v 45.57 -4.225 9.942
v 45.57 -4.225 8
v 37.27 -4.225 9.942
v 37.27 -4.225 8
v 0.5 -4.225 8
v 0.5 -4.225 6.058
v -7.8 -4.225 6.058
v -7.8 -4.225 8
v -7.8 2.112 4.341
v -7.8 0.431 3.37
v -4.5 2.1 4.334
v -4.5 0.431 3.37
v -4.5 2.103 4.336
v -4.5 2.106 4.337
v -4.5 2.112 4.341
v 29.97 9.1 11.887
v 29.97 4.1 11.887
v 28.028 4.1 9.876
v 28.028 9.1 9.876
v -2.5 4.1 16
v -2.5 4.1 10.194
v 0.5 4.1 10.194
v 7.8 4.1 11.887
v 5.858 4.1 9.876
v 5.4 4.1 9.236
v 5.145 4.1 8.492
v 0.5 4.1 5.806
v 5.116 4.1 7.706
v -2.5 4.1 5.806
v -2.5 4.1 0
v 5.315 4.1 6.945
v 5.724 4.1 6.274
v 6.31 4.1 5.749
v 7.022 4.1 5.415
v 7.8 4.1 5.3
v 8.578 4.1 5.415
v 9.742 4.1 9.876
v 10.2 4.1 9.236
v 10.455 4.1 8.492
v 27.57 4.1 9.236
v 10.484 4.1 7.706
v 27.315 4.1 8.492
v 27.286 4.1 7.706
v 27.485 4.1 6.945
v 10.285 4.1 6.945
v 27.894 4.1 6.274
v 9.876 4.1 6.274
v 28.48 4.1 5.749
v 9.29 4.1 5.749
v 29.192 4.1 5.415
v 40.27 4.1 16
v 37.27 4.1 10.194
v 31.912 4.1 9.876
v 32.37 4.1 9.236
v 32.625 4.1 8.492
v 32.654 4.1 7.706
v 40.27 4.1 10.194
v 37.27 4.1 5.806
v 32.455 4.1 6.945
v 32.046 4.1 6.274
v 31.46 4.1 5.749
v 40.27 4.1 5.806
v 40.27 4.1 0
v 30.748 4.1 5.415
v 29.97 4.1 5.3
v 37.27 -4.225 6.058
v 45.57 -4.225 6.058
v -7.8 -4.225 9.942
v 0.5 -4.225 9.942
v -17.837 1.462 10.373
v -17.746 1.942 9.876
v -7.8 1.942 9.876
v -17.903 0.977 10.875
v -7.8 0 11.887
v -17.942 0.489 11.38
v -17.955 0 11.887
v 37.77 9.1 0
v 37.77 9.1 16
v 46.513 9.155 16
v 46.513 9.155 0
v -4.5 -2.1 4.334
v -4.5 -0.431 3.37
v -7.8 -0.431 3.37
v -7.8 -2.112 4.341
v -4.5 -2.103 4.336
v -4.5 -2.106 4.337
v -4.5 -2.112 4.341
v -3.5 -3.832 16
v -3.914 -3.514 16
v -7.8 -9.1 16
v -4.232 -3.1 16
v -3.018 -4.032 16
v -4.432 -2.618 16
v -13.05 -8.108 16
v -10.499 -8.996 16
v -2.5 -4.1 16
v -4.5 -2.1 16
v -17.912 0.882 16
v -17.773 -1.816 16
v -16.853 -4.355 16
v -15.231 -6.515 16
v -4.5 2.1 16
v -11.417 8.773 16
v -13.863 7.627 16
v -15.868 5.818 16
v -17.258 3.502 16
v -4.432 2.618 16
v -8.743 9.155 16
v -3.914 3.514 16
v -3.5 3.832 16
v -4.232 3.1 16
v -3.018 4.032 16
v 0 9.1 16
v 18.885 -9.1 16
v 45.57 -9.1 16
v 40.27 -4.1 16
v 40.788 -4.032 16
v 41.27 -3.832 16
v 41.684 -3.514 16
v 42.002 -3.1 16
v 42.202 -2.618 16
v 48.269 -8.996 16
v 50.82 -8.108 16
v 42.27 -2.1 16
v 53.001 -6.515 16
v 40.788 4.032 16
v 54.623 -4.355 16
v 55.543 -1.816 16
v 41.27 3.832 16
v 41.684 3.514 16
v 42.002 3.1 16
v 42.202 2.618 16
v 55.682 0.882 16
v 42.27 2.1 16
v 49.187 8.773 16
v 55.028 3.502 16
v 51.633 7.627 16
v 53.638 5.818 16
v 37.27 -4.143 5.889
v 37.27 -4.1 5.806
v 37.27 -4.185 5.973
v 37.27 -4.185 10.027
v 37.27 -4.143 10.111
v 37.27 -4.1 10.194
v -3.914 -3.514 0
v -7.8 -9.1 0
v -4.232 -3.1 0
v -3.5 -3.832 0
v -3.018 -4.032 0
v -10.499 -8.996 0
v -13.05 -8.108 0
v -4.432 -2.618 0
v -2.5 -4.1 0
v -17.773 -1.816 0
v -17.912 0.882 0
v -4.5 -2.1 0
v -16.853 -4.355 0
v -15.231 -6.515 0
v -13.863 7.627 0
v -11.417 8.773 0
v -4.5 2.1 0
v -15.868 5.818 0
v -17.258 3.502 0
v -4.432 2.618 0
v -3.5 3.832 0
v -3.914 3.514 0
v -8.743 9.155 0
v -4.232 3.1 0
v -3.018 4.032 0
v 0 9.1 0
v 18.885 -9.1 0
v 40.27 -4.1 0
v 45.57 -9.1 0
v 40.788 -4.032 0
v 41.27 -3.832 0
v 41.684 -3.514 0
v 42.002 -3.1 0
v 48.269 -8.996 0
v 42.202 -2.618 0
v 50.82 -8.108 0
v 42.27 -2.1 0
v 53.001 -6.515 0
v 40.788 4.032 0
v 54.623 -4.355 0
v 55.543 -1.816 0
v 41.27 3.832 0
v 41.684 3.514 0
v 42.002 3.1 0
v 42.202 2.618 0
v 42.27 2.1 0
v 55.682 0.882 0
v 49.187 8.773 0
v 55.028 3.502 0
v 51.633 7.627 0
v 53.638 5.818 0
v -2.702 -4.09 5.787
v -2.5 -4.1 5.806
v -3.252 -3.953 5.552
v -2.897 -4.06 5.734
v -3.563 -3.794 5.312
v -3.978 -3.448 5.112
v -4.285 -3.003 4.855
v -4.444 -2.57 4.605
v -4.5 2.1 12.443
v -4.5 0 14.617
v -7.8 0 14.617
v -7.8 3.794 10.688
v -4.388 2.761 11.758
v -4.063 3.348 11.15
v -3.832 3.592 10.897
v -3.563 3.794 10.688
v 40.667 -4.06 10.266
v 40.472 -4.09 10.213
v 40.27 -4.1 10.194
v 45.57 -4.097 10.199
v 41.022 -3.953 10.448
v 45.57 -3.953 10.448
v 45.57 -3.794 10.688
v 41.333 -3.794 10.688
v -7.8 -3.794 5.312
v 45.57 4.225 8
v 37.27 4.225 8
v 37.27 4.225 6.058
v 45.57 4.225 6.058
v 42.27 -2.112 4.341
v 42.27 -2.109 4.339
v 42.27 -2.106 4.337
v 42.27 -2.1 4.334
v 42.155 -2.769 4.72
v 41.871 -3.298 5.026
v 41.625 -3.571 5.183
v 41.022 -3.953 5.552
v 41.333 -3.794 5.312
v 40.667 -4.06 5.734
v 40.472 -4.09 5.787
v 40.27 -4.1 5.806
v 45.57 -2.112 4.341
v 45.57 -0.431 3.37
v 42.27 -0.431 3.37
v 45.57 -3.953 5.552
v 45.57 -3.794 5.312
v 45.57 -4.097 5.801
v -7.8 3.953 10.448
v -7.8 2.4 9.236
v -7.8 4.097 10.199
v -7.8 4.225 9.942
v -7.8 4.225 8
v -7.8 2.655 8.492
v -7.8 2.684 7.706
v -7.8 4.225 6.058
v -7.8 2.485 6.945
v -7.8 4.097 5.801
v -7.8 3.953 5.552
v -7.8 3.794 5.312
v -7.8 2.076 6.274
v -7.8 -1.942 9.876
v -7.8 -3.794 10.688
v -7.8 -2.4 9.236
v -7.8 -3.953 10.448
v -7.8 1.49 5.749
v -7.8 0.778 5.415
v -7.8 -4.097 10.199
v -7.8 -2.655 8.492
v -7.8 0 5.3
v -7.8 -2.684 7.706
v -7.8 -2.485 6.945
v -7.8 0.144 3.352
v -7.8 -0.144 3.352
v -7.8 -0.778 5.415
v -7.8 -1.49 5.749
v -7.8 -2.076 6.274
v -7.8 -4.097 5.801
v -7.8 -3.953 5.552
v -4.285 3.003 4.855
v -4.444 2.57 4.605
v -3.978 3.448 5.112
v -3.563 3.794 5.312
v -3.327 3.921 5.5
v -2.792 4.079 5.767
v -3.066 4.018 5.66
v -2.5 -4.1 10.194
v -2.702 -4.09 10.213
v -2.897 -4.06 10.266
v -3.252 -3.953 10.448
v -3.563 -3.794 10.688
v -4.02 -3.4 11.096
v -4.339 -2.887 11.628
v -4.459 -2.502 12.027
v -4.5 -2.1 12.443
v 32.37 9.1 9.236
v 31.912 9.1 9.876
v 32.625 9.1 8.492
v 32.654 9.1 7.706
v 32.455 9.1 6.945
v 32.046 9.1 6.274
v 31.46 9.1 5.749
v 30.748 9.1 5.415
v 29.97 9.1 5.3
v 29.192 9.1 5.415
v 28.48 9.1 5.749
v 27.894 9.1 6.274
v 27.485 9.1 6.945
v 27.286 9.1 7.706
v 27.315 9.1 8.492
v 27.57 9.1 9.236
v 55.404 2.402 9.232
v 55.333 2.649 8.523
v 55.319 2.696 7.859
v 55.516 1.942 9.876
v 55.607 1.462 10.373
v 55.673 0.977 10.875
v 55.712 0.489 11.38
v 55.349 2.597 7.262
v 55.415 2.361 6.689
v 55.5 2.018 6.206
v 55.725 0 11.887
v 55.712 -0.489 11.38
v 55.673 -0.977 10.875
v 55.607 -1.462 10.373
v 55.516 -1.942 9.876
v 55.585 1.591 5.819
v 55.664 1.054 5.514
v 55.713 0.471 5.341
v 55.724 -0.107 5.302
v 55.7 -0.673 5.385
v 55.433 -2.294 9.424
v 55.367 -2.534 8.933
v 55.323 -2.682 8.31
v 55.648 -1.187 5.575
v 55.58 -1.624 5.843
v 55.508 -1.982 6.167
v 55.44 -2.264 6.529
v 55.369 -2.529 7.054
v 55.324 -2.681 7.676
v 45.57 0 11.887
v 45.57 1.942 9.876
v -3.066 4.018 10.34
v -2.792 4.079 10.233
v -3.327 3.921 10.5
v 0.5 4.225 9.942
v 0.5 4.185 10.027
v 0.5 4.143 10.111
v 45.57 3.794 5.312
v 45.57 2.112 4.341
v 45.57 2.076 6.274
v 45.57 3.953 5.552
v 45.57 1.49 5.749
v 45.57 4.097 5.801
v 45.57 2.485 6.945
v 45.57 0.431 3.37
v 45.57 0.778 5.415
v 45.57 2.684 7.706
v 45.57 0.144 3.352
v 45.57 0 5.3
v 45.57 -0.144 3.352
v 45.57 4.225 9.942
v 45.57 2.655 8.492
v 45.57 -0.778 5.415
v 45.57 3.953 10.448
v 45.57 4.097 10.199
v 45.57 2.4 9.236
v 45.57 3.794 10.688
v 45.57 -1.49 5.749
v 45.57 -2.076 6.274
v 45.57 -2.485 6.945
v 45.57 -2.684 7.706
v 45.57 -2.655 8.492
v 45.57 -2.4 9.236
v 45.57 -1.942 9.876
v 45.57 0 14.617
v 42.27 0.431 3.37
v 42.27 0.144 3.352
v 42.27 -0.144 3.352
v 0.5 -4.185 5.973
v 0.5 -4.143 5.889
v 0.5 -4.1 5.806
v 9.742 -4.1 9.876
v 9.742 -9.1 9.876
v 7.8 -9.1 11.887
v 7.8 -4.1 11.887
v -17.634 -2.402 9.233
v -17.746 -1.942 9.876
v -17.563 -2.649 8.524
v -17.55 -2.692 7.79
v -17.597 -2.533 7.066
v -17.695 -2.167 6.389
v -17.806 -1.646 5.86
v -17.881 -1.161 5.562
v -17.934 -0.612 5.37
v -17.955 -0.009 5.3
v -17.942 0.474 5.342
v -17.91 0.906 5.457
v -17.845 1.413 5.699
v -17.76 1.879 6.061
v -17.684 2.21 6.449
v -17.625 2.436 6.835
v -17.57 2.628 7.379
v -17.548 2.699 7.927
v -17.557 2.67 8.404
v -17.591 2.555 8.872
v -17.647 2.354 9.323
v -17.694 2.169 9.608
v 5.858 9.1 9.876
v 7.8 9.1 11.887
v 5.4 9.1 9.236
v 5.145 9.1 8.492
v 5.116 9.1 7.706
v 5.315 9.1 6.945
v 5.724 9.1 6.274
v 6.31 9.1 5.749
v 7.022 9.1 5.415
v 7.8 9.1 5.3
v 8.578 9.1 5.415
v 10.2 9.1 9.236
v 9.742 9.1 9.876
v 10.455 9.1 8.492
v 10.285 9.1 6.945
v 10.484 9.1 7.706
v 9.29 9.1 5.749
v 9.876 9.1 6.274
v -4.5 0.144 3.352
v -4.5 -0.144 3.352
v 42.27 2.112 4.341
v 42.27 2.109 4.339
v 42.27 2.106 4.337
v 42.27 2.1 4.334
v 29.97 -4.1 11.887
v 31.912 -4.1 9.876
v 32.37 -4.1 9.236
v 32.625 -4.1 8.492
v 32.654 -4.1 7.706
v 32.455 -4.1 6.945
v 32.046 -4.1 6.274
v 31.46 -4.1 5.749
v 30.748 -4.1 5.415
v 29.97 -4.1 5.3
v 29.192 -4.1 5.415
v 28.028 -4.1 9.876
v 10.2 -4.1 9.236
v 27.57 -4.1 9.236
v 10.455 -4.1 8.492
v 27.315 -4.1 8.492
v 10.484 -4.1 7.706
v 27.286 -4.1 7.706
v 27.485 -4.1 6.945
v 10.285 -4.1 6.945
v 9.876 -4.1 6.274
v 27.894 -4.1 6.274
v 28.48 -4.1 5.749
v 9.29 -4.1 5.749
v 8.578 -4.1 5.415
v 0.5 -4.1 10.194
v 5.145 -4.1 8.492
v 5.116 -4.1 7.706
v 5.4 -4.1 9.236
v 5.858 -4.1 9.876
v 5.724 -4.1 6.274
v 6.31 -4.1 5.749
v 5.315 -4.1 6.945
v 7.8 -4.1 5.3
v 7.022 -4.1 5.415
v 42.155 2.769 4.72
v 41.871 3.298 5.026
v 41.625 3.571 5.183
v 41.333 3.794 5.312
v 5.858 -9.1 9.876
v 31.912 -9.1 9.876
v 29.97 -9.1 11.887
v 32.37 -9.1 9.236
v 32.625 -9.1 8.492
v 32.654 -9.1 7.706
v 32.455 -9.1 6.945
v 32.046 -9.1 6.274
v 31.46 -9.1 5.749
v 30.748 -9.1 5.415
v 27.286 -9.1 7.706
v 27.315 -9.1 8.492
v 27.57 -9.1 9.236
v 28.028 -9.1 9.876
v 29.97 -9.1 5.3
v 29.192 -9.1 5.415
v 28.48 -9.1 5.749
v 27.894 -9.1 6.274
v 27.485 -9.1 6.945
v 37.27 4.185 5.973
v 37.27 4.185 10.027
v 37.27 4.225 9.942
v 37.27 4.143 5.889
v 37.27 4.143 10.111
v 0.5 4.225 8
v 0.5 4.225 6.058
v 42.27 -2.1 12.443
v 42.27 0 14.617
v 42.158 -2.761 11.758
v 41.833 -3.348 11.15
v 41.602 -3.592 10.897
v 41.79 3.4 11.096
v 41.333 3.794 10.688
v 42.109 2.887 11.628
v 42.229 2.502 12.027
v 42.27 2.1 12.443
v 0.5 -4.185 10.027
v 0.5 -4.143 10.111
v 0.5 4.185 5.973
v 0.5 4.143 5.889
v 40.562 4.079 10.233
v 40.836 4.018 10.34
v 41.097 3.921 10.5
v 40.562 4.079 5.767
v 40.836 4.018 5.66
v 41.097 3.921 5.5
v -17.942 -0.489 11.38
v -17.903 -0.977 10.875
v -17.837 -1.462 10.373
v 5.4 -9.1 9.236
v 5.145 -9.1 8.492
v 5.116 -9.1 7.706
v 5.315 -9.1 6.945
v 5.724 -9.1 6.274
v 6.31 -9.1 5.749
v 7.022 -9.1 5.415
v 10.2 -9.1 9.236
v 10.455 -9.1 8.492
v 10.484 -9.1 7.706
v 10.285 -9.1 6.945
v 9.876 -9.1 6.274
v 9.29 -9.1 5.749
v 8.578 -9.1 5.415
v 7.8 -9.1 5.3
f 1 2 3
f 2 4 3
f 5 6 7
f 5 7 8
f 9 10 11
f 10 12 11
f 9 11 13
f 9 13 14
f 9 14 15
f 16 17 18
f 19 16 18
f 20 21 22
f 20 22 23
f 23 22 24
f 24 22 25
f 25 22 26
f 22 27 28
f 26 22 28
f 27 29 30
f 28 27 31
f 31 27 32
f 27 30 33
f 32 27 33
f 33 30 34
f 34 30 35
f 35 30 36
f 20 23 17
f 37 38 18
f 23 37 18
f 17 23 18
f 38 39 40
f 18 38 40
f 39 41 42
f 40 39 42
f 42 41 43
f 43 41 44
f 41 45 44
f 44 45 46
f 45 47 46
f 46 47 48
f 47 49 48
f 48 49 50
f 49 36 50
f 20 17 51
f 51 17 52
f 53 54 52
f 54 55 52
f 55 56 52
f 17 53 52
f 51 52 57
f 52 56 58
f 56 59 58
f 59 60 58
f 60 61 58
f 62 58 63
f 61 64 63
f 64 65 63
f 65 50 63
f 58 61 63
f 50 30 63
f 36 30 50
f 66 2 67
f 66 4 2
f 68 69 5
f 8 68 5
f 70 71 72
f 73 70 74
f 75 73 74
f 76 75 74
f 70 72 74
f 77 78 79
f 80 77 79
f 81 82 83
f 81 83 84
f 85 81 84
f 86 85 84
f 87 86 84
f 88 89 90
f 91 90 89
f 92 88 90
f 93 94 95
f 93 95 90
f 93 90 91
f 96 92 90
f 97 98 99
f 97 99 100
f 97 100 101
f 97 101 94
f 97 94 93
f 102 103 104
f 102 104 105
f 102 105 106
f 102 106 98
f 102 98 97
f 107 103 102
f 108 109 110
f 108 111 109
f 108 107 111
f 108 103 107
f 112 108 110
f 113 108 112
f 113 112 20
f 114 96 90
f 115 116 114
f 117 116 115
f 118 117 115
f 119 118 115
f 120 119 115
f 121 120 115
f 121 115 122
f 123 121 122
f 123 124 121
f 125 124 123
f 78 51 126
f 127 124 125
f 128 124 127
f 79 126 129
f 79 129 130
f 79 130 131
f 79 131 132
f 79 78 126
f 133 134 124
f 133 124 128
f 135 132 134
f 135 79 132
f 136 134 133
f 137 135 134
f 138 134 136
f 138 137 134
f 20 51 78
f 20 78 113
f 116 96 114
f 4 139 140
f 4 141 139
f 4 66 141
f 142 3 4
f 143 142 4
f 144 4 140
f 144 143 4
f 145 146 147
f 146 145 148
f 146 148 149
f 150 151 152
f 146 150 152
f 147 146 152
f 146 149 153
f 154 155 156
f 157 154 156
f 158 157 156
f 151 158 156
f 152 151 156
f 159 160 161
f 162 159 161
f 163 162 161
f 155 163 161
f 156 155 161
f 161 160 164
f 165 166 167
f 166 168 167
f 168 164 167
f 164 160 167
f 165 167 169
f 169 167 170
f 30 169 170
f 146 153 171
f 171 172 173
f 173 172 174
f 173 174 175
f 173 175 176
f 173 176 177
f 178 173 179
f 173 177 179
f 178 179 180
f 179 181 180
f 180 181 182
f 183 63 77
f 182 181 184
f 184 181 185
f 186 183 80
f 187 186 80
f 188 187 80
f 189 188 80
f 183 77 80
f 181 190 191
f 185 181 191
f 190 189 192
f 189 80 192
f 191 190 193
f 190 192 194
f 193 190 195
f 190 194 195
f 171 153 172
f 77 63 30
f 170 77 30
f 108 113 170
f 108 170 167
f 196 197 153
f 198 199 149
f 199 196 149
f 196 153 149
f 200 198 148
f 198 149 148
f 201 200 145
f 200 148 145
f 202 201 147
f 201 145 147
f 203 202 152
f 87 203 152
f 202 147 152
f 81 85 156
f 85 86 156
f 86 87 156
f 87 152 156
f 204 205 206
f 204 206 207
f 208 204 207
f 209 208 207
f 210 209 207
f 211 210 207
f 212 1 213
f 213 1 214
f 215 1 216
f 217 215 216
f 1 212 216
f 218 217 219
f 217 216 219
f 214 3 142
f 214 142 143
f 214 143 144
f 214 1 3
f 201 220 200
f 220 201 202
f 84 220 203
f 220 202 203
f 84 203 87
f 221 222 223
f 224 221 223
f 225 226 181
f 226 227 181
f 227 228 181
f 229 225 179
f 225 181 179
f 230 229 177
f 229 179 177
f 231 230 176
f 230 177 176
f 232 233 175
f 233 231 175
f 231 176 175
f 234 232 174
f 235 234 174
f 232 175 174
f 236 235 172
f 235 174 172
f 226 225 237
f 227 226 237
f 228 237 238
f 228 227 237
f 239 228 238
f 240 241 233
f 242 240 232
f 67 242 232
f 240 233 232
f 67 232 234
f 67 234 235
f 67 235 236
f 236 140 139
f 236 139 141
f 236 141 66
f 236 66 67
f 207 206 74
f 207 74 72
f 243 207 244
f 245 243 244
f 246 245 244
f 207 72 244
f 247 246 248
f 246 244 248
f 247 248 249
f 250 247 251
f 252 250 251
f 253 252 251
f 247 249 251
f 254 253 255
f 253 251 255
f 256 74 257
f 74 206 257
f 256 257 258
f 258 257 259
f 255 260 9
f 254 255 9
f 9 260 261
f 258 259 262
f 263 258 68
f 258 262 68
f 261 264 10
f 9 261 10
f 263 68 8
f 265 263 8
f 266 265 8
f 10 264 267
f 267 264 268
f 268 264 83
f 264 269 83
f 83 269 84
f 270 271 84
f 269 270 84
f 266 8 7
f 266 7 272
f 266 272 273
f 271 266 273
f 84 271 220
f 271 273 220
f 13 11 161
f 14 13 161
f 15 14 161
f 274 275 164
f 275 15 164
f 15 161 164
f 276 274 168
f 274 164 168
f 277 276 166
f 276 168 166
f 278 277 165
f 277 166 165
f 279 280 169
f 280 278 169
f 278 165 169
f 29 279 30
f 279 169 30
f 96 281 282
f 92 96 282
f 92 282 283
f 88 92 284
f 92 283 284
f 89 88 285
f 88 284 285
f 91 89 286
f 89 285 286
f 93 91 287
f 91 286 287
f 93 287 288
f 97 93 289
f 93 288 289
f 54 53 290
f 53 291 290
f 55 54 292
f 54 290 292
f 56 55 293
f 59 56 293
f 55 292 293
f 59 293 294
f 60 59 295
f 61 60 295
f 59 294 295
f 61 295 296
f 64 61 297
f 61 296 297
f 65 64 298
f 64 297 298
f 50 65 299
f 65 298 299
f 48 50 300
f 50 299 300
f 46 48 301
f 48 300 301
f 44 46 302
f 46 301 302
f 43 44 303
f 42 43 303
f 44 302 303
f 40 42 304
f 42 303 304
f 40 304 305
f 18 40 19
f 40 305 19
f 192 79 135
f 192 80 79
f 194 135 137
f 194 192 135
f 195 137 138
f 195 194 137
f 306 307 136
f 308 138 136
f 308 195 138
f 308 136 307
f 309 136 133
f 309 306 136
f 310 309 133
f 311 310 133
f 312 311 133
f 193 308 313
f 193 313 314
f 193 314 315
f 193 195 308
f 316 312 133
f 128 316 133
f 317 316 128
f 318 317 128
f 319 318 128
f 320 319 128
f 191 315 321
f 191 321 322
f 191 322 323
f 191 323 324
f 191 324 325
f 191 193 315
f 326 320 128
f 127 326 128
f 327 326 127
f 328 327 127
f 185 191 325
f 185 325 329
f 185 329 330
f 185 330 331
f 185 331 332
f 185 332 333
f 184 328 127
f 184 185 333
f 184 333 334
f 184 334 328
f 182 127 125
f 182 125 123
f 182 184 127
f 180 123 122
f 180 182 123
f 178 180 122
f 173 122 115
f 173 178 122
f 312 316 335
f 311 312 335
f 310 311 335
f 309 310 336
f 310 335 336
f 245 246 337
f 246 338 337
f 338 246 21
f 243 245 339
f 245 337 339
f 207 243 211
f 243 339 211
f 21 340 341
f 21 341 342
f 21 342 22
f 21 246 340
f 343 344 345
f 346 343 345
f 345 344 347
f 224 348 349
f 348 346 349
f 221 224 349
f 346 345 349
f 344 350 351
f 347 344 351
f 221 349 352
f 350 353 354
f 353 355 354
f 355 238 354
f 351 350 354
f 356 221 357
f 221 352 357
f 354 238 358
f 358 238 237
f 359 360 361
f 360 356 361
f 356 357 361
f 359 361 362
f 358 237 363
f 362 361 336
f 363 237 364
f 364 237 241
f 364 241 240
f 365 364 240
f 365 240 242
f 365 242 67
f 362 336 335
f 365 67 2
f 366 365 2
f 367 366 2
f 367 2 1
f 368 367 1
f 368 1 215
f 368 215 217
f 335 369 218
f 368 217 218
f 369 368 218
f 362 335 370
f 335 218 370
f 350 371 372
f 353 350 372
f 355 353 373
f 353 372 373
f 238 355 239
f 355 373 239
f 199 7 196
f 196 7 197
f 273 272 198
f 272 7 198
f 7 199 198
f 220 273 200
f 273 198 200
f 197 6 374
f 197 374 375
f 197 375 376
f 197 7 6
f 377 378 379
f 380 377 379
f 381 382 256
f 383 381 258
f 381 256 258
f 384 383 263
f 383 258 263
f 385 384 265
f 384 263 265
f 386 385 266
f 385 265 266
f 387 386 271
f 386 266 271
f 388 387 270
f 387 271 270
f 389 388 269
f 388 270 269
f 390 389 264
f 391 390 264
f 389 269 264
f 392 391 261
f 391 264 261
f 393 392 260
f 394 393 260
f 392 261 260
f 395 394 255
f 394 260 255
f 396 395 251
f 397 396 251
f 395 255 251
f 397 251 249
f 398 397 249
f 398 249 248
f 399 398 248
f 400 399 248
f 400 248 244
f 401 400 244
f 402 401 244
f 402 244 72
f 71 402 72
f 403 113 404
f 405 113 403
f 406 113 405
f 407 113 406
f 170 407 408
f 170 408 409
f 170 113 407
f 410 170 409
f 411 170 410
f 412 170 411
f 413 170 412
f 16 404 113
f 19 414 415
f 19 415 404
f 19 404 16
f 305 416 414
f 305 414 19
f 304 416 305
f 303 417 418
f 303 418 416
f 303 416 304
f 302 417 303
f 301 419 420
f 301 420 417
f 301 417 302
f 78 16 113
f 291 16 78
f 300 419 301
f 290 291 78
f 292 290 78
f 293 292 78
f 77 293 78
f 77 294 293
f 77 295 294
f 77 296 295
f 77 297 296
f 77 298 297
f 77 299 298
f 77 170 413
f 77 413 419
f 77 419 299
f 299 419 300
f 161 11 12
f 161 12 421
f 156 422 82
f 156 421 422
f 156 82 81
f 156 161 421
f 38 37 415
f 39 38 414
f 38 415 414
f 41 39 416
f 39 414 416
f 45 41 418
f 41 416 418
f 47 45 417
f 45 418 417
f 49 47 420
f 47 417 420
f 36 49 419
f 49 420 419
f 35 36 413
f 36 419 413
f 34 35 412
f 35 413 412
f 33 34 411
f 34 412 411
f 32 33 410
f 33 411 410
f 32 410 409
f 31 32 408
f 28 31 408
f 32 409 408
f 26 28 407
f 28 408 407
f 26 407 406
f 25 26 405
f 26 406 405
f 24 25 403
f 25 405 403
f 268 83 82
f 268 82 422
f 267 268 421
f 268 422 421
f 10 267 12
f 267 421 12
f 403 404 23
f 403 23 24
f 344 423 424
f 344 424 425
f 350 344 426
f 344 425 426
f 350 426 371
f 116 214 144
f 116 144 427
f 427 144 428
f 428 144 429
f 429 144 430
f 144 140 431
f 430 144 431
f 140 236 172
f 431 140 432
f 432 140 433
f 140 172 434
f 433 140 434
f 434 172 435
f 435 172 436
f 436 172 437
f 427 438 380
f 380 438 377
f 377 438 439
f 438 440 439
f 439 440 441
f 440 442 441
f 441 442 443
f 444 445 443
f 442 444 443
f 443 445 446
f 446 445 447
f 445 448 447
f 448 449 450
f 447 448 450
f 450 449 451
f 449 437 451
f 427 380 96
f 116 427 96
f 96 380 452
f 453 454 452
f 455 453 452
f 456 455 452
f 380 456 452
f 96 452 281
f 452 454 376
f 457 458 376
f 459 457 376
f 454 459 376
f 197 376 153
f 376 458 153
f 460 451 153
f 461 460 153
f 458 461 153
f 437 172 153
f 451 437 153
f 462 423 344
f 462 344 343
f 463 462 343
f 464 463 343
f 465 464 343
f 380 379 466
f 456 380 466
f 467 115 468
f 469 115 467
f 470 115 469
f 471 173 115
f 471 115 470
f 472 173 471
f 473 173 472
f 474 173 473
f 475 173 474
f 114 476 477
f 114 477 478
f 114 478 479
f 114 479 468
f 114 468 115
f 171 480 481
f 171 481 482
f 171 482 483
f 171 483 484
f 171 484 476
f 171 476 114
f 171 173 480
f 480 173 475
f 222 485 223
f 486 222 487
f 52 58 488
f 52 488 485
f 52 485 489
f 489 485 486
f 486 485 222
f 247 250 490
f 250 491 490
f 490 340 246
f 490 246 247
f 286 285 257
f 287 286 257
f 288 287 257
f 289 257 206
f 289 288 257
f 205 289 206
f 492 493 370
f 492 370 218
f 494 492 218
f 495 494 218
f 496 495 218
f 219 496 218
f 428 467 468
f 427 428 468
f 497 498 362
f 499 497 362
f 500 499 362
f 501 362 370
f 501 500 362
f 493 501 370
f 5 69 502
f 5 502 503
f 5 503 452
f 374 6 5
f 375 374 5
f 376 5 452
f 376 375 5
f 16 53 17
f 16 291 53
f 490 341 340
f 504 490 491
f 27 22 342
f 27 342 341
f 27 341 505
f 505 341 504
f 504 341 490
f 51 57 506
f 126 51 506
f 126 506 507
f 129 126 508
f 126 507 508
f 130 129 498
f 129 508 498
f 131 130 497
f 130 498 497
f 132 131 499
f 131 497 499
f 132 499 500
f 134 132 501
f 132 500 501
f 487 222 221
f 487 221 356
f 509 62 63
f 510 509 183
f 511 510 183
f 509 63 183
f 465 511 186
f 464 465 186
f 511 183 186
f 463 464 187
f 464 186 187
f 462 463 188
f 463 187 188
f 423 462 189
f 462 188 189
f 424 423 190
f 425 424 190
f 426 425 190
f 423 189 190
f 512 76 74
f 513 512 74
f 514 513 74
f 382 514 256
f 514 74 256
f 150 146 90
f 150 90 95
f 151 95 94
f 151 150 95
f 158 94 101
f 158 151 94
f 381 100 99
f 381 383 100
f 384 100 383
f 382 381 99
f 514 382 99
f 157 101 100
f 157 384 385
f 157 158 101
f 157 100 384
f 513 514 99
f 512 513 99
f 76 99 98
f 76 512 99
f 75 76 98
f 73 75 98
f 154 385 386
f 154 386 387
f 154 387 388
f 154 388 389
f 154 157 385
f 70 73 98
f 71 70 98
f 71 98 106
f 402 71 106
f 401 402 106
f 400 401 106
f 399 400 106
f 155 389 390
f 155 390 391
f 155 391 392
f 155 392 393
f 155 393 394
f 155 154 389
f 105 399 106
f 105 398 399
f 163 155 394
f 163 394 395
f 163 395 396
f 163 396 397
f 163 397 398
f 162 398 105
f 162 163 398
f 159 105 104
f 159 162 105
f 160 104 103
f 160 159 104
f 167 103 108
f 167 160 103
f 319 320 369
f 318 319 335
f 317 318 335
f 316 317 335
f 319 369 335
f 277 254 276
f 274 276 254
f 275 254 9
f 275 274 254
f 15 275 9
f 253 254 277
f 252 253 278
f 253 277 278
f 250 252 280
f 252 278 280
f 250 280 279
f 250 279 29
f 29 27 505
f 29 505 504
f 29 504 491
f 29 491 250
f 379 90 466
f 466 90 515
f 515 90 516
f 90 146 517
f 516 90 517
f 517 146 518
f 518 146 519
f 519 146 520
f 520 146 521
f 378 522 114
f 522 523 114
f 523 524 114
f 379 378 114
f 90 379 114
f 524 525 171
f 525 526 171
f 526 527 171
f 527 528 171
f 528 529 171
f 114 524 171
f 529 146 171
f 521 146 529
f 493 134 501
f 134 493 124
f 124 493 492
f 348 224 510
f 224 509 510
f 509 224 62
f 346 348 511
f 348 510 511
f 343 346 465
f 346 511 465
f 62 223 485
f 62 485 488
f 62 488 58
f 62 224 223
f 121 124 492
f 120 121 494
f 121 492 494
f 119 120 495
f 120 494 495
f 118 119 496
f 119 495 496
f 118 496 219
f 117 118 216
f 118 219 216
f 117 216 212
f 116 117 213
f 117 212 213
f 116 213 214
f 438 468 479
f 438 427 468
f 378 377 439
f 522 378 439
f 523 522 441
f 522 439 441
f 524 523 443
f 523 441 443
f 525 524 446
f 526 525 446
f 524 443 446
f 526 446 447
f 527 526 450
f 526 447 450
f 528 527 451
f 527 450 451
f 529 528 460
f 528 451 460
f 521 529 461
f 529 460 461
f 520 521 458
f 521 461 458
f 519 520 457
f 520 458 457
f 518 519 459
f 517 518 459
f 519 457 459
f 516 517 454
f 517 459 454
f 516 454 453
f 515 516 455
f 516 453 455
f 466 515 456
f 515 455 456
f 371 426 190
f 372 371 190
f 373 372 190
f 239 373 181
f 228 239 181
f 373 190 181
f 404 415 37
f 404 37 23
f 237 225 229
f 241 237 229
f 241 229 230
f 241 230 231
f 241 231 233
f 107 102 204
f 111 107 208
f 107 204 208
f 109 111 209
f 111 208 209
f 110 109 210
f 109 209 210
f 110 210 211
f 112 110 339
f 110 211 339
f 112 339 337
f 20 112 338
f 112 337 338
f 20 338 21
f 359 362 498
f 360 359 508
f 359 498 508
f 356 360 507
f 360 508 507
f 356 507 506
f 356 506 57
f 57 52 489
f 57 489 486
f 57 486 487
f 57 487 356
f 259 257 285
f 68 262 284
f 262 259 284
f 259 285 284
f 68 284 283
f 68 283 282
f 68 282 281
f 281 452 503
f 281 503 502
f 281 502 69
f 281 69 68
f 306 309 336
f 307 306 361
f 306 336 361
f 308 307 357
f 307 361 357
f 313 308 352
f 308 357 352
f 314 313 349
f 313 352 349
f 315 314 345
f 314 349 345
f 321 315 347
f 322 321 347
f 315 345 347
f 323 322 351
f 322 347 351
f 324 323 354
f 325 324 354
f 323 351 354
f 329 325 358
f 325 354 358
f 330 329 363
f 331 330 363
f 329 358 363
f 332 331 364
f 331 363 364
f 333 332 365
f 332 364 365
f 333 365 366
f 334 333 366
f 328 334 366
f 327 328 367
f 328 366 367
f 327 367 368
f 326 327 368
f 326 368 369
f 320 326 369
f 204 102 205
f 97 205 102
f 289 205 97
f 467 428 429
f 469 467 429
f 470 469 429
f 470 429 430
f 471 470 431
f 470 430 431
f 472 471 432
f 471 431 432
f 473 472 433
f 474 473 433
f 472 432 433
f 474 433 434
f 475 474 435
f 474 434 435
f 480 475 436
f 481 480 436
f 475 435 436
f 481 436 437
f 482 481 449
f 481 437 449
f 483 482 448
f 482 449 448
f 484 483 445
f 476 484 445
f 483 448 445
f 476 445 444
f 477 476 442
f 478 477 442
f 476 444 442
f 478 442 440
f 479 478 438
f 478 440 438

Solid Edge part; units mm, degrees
sketch "Sketch1" plane through (0, 0, 0) normal (0, 0, 1) x (1, 0, 0)
  line L0 (-7.8, -9.1) -> (18.885, -9.1)
  line L1 (45.57, -9.1) -> (18.885, -9.1)
  arc A0 (46.5128, 9.1546) -> (45.57, -9.1) centre (46.57, 0) cw
  line L2 (37.77, 9.1) -> (46.5128, 9.1546)
  line L3 (19.385, 9.1) -> (37.77, 9.1)
  line L4 (19.385, 9.1) -> (18.885, 9.1)
  line L5 (18.385, 9.1) -> (18.885, 9.1)
  line L6 (18.385, 9.1) -> (0, 9.1)
  line L7 (0, 9.1) -> (-8.7428, 9.1546)
  arc A1 (-8.7428, 9.1546) -> (-7.8, -9.1) centre (-8.8, 0) ccw
  line L8 (18.885, 4.1) -> (38.77, 4.1)
  line L9 (38.77, 4.1) -> (40.27, 4.1)
  arc A2 (40.27, 4.1) -> (42.27, 2.1) centre (40.27, 2.1) cw
  line L10 (42.27, 2.1) -> (42.27, -2.1)
  arc A3 (42.27, -2.1) -> (40.27, -4.1) centre (40.27, -2.1) cw
  line L11 (40.27, -4.1) -> (18.885, -4.1)
  line L12 (-2.5, -4.1) -> (18.885, -4.1)
  arc A4 (-4.5, -2.1) -> (-2.5, -4.1) centre (-2.5, -2.1) ccw
  line L13 (-4.5, 2.1) -> (-4.5, -2.1)
  arc A5 (-2.5, 4.1) -> (-4.5, 2.1) centre (-2.5, 2.1) ccw
  line L14 (-1, 4.1) -> (-2.5, 4.1)
  line L15 (18.885, 4.1) -> (-1, 4.1)
extrude "Protrusion1" add sketch "Sketch1" along normal blind 16
sketch "Sketch2" plane through (-4.5, 0, 8) normal (1, 0, 0) x (0, 1, 0)
  line L0 (0, 6.6171) -> (3.7944, 2.6879)
  arc A0 (3.7944, 2.6879) -> (4.225, 1.9421) centre (0, 0) cw
  line L1 (4.225, 1.9421) -> (4.225, 0)
  line L2 (4.225, -1.9421) -> (4.225, 0)
  arc A1 (4.225, -1.9421) -> (3.7944, -2.6879) centre (0, 0) cw
  line L3 (3.7944, -2.6879) -> (2.1125, -3.659)
  line L4 (0.4306, -4.63) -> (2.1125, -3.659)
  arc A2 (0.4306, -4.63) -> (-0.4306, -4.63) centre (0, 0) cw
  line L5 (-0.4306, -4.63) -> (-2.1125, -3.659)
  line L6 (-3.7944, -2.6879) -> (-2.1125, -3.659)
  arc A3 (-3.7944, -2.6879) -> (-4.225, -1.9421) centre (0, 0) cw
  line L7 (-4.225, -1.9421) -> (-4.225, 0)
  line L8 (-4.225, 1.9421) -> (-4.225, 0)
  arc A4 (-4.225, 1.9421) -> (-3.7944, 2.6879) centre (0, 0) cw
  line L9 (-3.7944, 2.6879) -> (0, 6.6171)
extrude "ExtrudedCutout_1" cut sketch "Sketch2" against normal blind 3.3 and the other way blind 5
sketch "Sketch3" plane through (-4.5, 0, 8) normal (1, 0, 0) x (0, 1, 0)
  line L0 (0, 3.8868) -> (-1.9422, 1.8756)
  line L1 (1.9422, 1.8756) -> (0, 3.8868)
  arc A0 (1.9422, 1.8756) -> (-1.9422, 1.8756) centre (0, 0) cw
extrude "Cutout1" cut sketch "Sketch3" against normal through all
sketch "Sketch4" plane through (18.385, 9.1, 8) normal (0, 1, 0) x (-1, 0, 0)
  arc A0 (-13.5272, 1.8756) -> (-9.6428, 1.8756) centre (-11.585, 0) ccw
  line L0 (-11.585, 3.8868) -> (-9.6428, 1.8756)
  line L1 (-13.5272, 1.8756) -> (-11.585, 3.8868)
extrude "Cutout2" cut sketch "Sketch4" against normal through all
mirror "Mirror1" about plane through (18.885, 0, 0) normal (1, 0, 0) of "ExtrudedCutout_1", "Cutout1", "Cutout2"
properties material "ABS Plastic, medium impact"
